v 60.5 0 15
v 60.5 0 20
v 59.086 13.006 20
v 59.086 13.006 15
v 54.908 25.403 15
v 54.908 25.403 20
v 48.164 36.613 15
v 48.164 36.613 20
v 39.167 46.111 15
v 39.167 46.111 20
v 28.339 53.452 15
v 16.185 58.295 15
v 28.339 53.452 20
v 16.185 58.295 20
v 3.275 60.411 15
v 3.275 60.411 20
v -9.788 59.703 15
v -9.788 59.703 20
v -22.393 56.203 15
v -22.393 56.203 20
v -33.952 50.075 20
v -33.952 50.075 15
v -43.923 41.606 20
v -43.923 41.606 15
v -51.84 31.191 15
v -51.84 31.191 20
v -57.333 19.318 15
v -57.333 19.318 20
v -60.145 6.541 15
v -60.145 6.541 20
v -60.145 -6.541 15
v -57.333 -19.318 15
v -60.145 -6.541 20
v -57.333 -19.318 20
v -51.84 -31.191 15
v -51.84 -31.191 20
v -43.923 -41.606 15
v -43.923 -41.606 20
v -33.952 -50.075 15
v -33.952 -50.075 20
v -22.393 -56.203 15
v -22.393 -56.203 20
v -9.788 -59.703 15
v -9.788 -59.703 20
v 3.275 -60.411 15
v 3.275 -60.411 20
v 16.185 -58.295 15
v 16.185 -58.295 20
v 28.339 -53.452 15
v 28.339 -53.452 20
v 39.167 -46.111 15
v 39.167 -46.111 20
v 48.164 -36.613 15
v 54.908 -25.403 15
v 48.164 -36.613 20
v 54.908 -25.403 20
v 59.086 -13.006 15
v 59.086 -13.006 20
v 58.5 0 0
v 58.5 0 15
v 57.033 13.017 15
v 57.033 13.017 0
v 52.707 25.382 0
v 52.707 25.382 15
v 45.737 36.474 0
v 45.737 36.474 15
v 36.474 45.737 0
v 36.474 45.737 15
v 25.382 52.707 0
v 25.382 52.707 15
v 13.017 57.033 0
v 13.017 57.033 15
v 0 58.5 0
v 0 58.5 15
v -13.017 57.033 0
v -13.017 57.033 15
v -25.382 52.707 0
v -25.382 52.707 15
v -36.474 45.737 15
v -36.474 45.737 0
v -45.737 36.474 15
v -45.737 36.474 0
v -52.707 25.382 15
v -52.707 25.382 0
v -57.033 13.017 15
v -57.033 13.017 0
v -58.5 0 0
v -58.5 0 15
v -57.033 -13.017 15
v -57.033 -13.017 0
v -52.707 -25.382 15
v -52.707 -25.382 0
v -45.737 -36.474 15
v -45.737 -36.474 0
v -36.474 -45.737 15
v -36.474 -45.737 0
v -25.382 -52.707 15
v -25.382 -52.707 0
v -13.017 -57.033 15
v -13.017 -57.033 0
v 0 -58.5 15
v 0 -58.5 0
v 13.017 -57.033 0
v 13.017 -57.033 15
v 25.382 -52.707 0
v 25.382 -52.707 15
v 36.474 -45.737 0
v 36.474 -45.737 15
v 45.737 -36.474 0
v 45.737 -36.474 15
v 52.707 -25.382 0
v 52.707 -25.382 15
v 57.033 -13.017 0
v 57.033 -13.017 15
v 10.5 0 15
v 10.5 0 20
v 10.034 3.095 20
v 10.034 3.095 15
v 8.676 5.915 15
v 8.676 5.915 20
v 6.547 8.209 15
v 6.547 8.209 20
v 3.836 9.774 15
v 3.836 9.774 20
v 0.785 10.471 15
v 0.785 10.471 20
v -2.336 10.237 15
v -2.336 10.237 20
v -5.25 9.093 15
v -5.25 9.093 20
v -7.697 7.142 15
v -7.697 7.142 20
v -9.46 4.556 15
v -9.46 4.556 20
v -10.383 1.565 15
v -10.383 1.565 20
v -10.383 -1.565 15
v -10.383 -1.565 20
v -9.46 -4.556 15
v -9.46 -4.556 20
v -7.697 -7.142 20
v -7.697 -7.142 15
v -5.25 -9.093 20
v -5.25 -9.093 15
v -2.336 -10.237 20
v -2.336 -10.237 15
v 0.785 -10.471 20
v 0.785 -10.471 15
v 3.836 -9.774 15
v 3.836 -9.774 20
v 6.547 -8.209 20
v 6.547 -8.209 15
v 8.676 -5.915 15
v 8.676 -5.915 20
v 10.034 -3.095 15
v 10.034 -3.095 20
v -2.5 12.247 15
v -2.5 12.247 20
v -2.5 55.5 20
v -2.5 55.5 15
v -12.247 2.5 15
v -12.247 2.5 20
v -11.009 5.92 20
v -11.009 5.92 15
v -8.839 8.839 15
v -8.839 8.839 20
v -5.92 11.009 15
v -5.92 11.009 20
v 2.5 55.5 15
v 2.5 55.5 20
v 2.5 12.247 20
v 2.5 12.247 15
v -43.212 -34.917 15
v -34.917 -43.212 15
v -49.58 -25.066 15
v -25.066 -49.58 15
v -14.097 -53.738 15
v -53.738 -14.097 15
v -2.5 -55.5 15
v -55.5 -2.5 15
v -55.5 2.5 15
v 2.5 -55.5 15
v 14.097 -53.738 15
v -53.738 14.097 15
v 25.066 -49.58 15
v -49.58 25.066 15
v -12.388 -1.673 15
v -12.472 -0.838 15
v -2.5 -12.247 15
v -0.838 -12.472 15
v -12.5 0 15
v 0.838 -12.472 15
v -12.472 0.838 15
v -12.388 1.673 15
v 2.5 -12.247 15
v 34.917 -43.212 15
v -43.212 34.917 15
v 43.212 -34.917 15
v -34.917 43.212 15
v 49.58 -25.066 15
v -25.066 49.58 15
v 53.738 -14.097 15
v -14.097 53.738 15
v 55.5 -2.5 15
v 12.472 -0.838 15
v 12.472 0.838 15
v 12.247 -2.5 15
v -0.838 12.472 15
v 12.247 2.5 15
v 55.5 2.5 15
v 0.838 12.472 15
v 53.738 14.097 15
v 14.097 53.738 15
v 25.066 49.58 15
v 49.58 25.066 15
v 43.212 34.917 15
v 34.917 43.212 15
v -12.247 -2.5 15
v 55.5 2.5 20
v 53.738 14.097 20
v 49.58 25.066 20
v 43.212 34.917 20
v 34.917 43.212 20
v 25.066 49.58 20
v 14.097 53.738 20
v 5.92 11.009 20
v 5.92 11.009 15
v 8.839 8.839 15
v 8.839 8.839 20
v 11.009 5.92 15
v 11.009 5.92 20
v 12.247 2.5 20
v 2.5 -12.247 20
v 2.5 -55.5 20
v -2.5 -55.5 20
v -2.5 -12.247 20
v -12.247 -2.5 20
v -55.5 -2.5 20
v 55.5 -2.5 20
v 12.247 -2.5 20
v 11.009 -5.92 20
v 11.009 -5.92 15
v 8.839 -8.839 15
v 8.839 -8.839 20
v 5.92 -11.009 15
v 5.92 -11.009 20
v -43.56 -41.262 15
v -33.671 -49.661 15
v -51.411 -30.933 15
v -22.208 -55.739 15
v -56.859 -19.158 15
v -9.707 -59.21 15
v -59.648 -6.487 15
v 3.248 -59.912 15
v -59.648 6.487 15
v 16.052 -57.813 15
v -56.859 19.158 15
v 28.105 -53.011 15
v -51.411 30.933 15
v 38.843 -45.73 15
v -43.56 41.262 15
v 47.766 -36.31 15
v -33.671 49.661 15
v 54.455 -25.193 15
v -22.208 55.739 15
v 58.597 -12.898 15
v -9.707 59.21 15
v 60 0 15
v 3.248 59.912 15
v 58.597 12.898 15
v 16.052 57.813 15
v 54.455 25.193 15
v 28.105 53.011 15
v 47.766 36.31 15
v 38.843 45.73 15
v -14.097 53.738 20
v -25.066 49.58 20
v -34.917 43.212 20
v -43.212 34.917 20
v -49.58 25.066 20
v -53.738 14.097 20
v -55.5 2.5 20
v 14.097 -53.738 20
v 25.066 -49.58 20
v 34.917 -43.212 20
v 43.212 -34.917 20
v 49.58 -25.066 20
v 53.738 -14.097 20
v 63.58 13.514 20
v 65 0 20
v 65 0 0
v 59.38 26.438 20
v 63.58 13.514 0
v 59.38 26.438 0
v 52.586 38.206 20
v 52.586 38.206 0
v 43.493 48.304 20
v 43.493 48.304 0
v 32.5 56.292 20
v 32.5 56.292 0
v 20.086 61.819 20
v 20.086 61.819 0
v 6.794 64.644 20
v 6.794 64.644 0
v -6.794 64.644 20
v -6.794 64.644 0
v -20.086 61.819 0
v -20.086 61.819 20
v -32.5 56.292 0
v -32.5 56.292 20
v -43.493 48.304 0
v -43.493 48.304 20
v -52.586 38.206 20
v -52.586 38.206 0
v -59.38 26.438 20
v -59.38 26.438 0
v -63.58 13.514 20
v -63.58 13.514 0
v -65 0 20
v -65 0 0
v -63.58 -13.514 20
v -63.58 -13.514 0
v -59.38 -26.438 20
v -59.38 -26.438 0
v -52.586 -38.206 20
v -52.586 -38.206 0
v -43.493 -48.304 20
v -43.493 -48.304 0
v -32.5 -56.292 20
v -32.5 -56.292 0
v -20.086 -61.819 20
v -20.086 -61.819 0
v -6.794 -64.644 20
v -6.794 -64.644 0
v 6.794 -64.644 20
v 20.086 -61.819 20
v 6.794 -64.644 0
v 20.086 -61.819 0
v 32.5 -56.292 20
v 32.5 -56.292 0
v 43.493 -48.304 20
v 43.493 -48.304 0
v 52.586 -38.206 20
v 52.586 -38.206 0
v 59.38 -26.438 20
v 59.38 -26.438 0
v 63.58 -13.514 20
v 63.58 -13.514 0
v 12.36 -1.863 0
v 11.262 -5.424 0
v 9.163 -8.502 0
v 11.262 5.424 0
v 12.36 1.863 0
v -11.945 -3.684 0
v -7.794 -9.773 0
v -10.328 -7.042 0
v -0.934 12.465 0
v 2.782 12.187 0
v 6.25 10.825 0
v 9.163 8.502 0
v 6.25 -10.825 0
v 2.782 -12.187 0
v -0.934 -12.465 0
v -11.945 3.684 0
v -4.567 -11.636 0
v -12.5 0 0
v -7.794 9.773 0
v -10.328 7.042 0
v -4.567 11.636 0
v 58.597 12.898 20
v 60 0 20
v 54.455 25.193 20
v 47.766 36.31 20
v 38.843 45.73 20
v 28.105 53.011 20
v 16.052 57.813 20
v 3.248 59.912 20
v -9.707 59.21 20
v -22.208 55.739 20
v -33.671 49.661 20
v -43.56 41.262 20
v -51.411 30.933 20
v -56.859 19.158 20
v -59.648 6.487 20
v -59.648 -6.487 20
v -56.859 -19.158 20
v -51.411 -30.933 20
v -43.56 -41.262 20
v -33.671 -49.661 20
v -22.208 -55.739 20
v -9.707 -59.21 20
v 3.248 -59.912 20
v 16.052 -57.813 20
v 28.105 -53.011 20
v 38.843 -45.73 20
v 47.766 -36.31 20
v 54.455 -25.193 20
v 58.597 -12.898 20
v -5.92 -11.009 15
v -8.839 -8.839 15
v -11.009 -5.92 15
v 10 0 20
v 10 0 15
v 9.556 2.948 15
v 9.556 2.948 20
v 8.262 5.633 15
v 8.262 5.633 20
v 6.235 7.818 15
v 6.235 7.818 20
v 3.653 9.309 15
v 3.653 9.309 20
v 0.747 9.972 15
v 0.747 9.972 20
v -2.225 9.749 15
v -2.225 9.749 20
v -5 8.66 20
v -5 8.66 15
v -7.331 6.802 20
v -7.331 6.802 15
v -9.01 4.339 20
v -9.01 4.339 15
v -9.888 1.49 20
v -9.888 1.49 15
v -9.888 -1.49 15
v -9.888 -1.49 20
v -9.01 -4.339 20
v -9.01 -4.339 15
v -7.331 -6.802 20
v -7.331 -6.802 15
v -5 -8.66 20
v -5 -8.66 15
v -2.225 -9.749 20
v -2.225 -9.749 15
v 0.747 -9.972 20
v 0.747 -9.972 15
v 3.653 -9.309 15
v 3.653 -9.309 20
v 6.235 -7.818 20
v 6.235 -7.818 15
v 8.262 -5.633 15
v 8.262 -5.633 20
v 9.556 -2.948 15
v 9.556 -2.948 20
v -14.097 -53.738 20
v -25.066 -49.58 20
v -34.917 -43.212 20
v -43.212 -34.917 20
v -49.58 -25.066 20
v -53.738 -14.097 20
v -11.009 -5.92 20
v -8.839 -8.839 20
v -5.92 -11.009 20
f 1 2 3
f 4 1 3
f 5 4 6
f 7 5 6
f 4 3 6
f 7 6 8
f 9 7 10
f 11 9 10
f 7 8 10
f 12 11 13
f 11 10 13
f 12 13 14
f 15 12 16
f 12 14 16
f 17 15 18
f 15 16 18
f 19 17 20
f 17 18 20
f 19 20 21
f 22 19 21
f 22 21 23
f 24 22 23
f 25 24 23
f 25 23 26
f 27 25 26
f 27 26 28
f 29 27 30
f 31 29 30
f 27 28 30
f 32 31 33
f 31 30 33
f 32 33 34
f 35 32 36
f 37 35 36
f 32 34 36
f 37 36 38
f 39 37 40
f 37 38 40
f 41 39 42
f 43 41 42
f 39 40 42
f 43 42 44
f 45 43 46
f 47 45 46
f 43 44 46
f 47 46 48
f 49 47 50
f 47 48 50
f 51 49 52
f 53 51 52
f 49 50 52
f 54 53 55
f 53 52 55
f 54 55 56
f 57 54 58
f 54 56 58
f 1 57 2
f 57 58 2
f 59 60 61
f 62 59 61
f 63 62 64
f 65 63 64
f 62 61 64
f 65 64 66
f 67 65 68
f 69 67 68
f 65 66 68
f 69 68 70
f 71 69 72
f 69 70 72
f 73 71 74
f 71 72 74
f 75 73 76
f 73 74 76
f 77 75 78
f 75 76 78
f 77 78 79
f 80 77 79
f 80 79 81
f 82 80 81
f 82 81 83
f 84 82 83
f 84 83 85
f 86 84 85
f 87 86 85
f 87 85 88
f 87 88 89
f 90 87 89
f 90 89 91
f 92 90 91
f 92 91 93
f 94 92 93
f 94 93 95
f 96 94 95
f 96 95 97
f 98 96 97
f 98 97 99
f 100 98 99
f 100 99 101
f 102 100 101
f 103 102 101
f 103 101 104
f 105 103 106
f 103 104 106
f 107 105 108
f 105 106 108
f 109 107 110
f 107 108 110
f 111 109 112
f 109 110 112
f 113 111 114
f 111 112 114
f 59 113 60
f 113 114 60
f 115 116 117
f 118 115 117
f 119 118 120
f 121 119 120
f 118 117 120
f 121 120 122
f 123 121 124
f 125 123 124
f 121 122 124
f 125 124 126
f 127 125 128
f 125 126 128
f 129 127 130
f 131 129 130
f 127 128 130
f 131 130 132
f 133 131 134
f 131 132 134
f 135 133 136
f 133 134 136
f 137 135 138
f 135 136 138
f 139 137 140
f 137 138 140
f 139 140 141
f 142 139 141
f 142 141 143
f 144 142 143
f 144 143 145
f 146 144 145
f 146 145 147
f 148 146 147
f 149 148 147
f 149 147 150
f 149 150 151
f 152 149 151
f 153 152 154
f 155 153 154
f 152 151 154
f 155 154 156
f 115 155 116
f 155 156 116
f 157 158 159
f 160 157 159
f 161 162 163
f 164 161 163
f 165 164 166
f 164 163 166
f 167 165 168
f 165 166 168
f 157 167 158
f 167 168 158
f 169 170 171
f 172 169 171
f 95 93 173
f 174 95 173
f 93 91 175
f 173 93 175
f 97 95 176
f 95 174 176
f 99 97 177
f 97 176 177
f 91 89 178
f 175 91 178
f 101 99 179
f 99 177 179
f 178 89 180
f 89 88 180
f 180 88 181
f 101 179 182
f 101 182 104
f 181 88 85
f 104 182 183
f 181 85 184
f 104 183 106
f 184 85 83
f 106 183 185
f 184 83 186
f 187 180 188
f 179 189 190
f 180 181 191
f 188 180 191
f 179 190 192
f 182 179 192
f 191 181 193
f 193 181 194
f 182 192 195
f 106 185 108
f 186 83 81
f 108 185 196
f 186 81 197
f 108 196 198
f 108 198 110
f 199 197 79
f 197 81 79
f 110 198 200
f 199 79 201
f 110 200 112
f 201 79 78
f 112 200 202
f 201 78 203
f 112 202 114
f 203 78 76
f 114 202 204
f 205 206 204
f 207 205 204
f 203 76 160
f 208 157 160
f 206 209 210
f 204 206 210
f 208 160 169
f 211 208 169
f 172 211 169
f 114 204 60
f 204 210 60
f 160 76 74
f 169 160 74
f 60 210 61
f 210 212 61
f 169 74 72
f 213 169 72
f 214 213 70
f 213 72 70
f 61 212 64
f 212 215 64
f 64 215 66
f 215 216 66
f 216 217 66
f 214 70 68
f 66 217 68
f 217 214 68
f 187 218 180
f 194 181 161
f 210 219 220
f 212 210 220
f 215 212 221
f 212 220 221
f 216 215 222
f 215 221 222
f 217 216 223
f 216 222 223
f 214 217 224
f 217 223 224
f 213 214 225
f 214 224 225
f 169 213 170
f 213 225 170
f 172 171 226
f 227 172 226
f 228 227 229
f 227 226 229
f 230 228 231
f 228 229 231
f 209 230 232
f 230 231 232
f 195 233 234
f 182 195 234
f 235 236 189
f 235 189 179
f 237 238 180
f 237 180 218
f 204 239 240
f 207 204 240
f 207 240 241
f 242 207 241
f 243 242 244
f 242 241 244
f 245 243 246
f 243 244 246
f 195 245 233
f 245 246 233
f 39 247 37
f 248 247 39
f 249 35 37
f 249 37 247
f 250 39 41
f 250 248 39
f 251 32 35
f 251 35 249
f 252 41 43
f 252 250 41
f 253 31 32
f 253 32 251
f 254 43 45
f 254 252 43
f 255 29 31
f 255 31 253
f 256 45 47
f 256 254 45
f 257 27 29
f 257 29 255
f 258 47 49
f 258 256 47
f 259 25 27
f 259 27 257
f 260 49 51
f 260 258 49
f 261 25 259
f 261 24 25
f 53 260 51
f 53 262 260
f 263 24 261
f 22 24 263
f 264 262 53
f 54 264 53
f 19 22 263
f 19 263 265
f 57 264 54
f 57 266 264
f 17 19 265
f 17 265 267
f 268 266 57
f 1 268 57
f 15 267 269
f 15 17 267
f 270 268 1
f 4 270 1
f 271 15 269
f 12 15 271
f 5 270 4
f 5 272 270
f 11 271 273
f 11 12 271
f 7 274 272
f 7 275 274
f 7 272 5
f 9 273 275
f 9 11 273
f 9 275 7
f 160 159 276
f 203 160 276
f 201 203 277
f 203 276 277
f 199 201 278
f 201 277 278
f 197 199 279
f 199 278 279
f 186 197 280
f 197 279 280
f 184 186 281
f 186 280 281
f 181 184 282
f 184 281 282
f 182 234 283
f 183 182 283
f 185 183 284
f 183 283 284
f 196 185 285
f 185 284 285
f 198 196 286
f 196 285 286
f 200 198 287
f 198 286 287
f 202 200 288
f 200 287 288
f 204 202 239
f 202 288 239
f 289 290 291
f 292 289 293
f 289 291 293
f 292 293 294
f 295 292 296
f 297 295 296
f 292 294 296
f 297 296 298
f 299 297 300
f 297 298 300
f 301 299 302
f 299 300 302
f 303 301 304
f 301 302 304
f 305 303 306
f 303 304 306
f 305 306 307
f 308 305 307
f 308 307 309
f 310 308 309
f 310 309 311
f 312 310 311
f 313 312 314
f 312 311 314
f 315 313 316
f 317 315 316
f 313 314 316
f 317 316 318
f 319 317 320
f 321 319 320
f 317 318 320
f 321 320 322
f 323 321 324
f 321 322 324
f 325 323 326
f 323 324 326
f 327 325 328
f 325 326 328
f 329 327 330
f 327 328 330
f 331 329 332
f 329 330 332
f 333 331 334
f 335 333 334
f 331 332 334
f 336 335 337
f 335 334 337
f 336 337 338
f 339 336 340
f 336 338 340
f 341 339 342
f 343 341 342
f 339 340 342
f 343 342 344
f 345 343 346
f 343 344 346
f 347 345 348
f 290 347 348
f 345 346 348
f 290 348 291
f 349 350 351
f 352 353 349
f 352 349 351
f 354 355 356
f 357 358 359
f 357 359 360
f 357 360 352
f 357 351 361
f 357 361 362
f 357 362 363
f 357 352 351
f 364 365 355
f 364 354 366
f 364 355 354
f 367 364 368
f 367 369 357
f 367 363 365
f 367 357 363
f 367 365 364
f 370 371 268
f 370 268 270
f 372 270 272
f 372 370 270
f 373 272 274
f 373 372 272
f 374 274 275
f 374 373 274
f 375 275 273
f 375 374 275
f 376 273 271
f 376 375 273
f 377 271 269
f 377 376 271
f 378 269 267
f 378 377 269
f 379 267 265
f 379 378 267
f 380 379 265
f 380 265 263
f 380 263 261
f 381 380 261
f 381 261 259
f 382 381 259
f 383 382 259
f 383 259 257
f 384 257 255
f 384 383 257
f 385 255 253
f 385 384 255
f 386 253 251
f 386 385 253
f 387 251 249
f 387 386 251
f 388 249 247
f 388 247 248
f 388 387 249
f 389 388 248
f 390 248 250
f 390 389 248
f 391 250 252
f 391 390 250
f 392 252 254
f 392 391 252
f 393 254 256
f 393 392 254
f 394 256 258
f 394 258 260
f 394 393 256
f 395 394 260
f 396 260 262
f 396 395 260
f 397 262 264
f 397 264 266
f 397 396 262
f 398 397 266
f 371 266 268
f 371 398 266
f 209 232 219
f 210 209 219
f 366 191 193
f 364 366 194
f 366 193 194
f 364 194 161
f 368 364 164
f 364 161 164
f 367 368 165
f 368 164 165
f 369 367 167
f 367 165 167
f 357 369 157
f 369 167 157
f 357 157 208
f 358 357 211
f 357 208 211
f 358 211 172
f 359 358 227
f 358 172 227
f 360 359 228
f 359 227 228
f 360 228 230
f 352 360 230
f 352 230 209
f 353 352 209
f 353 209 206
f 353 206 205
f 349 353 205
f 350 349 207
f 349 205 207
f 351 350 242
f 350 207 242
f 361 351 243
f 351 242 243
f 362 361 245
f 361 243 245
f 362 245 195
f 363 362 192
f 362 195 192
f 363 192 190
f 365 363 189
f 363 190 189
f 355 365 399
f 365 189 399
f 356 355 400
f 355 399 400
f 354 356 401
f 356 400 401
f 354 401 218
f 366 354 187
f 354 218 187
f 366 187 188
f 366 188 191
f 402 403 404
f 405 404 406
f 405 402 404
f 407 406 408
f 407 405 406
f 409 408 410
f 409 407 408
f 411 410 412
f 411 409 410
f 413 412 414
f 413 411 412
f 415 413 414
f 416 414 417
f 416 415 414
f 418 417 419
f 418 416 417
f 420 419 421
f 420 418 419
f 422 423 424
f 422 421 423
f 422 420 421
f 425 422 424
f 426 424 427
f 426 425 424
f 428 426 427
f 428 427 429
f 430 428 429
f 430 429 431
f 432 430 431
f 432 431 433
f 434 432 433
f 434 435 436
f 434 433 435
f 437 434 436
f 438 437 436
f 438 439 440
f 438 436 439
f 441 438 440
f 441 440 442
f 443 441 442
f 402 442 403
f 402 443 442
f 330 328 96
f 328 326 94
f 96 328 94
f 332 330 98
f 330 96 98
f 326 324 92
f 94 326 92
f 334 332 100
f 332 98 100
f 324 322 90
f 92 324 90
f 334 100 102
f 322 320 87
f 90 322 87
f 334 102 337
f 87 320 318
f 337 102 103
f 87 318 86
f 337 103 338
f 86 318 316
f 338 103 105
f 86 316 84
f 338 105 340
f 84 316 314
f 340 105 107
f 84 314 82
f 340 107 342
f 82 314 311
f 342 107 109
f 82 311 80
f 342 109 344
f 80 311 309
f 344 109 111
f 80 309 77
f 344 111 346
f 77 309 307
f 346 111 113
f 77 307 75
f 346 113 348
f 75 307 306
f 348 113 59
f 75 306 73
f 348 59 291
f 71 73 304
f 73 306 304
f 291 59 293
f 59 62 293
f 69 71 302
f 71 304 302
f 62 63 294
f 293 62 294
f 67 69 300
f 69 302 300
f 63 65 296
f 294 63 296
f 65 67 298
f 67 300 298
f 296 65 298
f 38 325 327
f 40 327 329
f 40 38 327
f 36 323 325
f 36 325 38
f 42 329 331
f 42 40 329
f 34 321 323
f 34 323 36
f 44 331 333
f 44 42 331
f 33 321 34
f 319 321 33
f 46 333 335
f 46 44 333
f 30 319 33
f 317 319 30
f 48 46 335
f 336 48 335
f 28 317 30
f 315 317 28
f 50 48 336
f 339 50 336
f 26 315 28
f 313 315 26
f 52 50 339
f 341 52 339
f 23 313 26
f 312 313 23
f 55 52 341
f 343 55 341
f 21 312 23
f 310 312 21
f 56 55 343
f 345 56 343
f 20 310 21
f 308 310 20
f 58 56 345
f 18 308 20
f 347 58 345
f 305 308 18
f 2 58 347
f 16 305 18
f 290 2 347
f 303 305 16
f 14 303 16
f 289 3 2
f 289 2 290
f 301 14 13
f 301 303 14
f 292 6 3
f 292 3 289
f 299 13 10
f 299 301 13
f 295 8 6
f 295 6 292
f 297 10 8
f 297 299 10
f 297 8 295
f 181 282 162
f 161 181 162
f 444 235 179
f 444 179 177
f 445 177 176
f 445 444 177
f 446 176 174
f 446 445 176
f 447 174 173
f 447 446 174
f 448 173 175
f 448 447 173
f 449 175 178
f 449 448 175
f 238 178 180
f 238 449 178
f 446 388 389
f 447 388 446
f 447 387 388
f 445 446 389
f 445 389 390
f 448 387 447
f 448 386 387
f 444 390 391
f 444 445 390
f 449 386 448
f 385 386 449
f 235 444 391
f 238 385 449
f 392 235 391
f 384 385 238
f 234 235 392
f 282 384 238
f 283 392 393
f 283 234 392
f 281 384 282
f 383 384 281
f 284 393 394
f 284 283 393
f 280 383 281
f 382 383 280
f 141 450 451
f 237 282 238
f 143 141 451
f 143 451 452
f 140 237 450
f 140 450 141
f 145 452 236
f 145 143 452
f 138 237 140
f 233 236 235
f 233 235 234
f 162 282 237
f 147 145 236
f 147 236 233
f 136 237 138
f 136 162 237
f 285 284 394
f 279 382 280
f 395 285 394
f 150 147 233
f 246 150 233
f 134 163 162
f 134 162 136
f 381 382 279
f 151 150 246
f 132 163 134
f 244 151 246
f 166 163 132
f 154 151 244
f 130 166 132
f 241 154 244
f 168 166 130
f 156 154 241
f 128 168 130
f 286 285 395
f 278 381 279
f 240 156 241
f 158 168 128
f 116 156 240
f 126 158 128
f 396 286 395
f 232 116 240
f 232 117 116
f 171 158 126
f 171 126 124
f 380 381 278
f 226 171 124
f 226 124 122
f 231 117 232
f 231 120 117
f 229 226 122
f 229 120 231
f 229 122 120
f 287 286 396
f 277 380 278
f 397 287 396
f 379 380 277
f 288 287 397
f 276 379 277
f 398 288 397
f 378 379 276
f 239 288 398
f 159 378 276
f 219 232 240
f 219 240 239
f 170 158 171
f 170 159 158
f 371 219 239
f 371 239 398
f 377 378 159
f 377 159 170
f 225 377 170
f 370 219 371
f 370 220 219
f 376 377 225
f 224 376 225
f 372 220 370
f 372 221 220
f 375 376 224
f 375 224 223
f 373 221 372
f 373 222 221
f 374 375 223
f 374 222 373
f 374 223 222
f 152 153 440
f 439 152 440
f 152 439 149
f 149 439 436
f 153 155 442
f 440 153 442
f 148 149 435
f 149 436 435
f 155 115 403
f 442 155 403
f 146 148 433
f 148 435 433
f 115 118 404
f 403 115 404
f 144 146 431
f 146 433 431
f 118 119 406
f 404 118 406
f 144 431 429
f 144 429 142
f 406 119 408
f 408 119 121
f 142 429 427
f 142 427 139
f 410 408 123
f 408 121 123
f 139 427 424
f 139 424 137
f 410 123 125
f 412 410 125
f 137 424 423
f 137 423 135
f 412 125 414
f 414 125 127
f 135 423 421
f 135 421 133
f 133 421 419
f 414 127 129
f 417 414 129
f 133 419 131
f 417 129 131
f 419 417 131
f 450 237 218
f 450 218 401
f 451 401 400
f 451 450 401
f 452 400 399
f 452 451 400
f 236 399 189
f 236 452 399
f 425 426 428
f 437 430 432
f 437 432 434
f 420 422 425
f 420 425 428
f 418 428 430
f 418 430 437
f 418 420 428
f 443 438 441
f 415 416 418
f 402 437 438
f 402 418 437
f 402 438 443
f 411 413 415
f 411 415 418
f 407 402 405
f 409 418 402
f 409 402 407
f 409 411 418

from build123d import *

# Parameters (mm, degrees)
SKETCH2_R           = 65
BOSS_EXTRUDE1_DEPTH = 20
SKETCH3_R           = 58.5
CUT_EXTRUDE1_DEPTH  = 20
SKETCH4_R           = 60.5
SKETCH4_R_2         = 60
CUT_EXTRUDE3_DEPTH  = 5
SKETCH5_R           = 10
BOSS_EXTRUDE2_DEPTH = 20
SKETCH6_R           = 58.5
SKETCH6_R_2         = 10.5
BOSS_EXTRUDE3_DEPTH = 5
CUT_EXTRUDE4_DEPTH  = 5
SKETCH9_R           = 12.5
SKETCH9_R_2         = 10
BOSS_EXTRUDE4_DEPTH = 15


with BuildPart() as part:
    # Sketch2 → Boss-Extrude1 (new body)
    with BuildSketch(Plane.XY):
        Circle(SKETCH2_R)
    extrude(amount=BOSS_EXTRUDE1_DEPTH)

    # Sketch3 → Cut-Extrude1 (cut)
    with BuildSketch(Plane.XY.offset(20)):
        Circle(SKETCH3_R)
    extrude(amount=-CUT_EXTRUDE1_DEPTH, mode=Mode.SUBTRACT)

    # Sketch4 → Cut-Extrude3 (cut)
    with BuildSketch(Plane.XY.offset(20)):
        Circle(SKETCH4_R)
        Circle(SKETCH4_R_2, mode=Mode.SUBTRACT)
    extrude(amount=-CUT_EXTRUDE3_DEPTH, mode=Mode.SUBTRACT)

    # Sketch6 → Boss-Extrude3 (add)
    with BuildSketch(Plane.XY.offset(20)):
        Circle(SKETCH6_R)
        Circle(SKETCH6_R_2, mode=Mode.SUBTRACT)
    extrude(amount=-BOSS_EXTRUDE3_DEPTH)

    # Sketch8 → Cut-Extrude4 (cut)
    with BuildSketch(Plane.XY.offset(20)):
        with BuildLine():
            Line((-2.5, 12.247448714), (-2.5, 55.5))
            ThreePointArc((-2.5, 55.5), (-39.284220751, 39.284220751), (-55.5, 2.5))
            Line((-55.5, 2.5), (-12.247448714, 2.5))
            ThreePointArc((-12.247448714, 2.5), (-8.838834765, 8.838834765), (-2.5, 12.247448714))
        make_face()
        with BuildLine():
            Line((2.5, -12.247448714), (2.5, -55.5))
            ThreePointArc((2.5, -55.5), (39.284220751, -39.284220751), (55.5, -2.5))
            Line((55.5, -2.5), (12.247448714, -2.5))
            ThreePointArc((12.247448714, -2.5), (8.838834765, -8.838834765), (2.5, -12.247448714))
        make_face()
        with BuildLine():
            Line((12.247448714, 2.5), (55.5, 2.5))
            ThreePointArc((55.5, 2.5), (39.284220751, 39.284220751), (2.5, 55.5))
            Line((2.5, 55.5), (2.5, 12.247448714))
            ThreePointArc((2.5, 12.247448714), (8.838834765, 8.838834765), (12.247448714, 2.5))
        make_face()
        with BuildLine():
            ThreePointArc((-12.247448714, -2.5), (-8.838834765, -8.838834765), (-2.5, -12.247448714))
            Line((-2.5, -12.247448714), (-2.5, -55.5))
            ThreePointArc((-2.5, -55.5), (-39.284220751, -39.284220751), (-55.5, -2.5))
            Line((-55.5, -2.5), (-12.247448714, -2.5))
        make_face()
    extrude(amount=-CUT_EXTRUDE4_DEPTH, mode=Mode.SUBTRACT)



with BuildPart() as body_2:
    # Sketch5 → Boss-Extrude2 (new body)
    with BuildSketch(Plane.XY.offset(20)):
        Circle(SKETCH5_R)
    extrude(amount=-BOSS_EXTRUDE2_DEPTH)


with BuildPart() as part_1:
    add(part.part)

    add(body_2.part)  # Boss-Extrude4 merges body 2
    # Sketch9 → Boss-Extrude4 (add)
    with BuildSketch(Plane(origin=(0, 0, 15), x_dir=(-1, 0, 0), z_dir=(0, 0, -1))):
        Circle(SKETCH9_R)
        Circle(SKETCH9_R_2, mode=Mode.SUBTRACT)
    extrude(amount=BOSS_EXTRUDE4_DEPTH)


solid = part_1.part
